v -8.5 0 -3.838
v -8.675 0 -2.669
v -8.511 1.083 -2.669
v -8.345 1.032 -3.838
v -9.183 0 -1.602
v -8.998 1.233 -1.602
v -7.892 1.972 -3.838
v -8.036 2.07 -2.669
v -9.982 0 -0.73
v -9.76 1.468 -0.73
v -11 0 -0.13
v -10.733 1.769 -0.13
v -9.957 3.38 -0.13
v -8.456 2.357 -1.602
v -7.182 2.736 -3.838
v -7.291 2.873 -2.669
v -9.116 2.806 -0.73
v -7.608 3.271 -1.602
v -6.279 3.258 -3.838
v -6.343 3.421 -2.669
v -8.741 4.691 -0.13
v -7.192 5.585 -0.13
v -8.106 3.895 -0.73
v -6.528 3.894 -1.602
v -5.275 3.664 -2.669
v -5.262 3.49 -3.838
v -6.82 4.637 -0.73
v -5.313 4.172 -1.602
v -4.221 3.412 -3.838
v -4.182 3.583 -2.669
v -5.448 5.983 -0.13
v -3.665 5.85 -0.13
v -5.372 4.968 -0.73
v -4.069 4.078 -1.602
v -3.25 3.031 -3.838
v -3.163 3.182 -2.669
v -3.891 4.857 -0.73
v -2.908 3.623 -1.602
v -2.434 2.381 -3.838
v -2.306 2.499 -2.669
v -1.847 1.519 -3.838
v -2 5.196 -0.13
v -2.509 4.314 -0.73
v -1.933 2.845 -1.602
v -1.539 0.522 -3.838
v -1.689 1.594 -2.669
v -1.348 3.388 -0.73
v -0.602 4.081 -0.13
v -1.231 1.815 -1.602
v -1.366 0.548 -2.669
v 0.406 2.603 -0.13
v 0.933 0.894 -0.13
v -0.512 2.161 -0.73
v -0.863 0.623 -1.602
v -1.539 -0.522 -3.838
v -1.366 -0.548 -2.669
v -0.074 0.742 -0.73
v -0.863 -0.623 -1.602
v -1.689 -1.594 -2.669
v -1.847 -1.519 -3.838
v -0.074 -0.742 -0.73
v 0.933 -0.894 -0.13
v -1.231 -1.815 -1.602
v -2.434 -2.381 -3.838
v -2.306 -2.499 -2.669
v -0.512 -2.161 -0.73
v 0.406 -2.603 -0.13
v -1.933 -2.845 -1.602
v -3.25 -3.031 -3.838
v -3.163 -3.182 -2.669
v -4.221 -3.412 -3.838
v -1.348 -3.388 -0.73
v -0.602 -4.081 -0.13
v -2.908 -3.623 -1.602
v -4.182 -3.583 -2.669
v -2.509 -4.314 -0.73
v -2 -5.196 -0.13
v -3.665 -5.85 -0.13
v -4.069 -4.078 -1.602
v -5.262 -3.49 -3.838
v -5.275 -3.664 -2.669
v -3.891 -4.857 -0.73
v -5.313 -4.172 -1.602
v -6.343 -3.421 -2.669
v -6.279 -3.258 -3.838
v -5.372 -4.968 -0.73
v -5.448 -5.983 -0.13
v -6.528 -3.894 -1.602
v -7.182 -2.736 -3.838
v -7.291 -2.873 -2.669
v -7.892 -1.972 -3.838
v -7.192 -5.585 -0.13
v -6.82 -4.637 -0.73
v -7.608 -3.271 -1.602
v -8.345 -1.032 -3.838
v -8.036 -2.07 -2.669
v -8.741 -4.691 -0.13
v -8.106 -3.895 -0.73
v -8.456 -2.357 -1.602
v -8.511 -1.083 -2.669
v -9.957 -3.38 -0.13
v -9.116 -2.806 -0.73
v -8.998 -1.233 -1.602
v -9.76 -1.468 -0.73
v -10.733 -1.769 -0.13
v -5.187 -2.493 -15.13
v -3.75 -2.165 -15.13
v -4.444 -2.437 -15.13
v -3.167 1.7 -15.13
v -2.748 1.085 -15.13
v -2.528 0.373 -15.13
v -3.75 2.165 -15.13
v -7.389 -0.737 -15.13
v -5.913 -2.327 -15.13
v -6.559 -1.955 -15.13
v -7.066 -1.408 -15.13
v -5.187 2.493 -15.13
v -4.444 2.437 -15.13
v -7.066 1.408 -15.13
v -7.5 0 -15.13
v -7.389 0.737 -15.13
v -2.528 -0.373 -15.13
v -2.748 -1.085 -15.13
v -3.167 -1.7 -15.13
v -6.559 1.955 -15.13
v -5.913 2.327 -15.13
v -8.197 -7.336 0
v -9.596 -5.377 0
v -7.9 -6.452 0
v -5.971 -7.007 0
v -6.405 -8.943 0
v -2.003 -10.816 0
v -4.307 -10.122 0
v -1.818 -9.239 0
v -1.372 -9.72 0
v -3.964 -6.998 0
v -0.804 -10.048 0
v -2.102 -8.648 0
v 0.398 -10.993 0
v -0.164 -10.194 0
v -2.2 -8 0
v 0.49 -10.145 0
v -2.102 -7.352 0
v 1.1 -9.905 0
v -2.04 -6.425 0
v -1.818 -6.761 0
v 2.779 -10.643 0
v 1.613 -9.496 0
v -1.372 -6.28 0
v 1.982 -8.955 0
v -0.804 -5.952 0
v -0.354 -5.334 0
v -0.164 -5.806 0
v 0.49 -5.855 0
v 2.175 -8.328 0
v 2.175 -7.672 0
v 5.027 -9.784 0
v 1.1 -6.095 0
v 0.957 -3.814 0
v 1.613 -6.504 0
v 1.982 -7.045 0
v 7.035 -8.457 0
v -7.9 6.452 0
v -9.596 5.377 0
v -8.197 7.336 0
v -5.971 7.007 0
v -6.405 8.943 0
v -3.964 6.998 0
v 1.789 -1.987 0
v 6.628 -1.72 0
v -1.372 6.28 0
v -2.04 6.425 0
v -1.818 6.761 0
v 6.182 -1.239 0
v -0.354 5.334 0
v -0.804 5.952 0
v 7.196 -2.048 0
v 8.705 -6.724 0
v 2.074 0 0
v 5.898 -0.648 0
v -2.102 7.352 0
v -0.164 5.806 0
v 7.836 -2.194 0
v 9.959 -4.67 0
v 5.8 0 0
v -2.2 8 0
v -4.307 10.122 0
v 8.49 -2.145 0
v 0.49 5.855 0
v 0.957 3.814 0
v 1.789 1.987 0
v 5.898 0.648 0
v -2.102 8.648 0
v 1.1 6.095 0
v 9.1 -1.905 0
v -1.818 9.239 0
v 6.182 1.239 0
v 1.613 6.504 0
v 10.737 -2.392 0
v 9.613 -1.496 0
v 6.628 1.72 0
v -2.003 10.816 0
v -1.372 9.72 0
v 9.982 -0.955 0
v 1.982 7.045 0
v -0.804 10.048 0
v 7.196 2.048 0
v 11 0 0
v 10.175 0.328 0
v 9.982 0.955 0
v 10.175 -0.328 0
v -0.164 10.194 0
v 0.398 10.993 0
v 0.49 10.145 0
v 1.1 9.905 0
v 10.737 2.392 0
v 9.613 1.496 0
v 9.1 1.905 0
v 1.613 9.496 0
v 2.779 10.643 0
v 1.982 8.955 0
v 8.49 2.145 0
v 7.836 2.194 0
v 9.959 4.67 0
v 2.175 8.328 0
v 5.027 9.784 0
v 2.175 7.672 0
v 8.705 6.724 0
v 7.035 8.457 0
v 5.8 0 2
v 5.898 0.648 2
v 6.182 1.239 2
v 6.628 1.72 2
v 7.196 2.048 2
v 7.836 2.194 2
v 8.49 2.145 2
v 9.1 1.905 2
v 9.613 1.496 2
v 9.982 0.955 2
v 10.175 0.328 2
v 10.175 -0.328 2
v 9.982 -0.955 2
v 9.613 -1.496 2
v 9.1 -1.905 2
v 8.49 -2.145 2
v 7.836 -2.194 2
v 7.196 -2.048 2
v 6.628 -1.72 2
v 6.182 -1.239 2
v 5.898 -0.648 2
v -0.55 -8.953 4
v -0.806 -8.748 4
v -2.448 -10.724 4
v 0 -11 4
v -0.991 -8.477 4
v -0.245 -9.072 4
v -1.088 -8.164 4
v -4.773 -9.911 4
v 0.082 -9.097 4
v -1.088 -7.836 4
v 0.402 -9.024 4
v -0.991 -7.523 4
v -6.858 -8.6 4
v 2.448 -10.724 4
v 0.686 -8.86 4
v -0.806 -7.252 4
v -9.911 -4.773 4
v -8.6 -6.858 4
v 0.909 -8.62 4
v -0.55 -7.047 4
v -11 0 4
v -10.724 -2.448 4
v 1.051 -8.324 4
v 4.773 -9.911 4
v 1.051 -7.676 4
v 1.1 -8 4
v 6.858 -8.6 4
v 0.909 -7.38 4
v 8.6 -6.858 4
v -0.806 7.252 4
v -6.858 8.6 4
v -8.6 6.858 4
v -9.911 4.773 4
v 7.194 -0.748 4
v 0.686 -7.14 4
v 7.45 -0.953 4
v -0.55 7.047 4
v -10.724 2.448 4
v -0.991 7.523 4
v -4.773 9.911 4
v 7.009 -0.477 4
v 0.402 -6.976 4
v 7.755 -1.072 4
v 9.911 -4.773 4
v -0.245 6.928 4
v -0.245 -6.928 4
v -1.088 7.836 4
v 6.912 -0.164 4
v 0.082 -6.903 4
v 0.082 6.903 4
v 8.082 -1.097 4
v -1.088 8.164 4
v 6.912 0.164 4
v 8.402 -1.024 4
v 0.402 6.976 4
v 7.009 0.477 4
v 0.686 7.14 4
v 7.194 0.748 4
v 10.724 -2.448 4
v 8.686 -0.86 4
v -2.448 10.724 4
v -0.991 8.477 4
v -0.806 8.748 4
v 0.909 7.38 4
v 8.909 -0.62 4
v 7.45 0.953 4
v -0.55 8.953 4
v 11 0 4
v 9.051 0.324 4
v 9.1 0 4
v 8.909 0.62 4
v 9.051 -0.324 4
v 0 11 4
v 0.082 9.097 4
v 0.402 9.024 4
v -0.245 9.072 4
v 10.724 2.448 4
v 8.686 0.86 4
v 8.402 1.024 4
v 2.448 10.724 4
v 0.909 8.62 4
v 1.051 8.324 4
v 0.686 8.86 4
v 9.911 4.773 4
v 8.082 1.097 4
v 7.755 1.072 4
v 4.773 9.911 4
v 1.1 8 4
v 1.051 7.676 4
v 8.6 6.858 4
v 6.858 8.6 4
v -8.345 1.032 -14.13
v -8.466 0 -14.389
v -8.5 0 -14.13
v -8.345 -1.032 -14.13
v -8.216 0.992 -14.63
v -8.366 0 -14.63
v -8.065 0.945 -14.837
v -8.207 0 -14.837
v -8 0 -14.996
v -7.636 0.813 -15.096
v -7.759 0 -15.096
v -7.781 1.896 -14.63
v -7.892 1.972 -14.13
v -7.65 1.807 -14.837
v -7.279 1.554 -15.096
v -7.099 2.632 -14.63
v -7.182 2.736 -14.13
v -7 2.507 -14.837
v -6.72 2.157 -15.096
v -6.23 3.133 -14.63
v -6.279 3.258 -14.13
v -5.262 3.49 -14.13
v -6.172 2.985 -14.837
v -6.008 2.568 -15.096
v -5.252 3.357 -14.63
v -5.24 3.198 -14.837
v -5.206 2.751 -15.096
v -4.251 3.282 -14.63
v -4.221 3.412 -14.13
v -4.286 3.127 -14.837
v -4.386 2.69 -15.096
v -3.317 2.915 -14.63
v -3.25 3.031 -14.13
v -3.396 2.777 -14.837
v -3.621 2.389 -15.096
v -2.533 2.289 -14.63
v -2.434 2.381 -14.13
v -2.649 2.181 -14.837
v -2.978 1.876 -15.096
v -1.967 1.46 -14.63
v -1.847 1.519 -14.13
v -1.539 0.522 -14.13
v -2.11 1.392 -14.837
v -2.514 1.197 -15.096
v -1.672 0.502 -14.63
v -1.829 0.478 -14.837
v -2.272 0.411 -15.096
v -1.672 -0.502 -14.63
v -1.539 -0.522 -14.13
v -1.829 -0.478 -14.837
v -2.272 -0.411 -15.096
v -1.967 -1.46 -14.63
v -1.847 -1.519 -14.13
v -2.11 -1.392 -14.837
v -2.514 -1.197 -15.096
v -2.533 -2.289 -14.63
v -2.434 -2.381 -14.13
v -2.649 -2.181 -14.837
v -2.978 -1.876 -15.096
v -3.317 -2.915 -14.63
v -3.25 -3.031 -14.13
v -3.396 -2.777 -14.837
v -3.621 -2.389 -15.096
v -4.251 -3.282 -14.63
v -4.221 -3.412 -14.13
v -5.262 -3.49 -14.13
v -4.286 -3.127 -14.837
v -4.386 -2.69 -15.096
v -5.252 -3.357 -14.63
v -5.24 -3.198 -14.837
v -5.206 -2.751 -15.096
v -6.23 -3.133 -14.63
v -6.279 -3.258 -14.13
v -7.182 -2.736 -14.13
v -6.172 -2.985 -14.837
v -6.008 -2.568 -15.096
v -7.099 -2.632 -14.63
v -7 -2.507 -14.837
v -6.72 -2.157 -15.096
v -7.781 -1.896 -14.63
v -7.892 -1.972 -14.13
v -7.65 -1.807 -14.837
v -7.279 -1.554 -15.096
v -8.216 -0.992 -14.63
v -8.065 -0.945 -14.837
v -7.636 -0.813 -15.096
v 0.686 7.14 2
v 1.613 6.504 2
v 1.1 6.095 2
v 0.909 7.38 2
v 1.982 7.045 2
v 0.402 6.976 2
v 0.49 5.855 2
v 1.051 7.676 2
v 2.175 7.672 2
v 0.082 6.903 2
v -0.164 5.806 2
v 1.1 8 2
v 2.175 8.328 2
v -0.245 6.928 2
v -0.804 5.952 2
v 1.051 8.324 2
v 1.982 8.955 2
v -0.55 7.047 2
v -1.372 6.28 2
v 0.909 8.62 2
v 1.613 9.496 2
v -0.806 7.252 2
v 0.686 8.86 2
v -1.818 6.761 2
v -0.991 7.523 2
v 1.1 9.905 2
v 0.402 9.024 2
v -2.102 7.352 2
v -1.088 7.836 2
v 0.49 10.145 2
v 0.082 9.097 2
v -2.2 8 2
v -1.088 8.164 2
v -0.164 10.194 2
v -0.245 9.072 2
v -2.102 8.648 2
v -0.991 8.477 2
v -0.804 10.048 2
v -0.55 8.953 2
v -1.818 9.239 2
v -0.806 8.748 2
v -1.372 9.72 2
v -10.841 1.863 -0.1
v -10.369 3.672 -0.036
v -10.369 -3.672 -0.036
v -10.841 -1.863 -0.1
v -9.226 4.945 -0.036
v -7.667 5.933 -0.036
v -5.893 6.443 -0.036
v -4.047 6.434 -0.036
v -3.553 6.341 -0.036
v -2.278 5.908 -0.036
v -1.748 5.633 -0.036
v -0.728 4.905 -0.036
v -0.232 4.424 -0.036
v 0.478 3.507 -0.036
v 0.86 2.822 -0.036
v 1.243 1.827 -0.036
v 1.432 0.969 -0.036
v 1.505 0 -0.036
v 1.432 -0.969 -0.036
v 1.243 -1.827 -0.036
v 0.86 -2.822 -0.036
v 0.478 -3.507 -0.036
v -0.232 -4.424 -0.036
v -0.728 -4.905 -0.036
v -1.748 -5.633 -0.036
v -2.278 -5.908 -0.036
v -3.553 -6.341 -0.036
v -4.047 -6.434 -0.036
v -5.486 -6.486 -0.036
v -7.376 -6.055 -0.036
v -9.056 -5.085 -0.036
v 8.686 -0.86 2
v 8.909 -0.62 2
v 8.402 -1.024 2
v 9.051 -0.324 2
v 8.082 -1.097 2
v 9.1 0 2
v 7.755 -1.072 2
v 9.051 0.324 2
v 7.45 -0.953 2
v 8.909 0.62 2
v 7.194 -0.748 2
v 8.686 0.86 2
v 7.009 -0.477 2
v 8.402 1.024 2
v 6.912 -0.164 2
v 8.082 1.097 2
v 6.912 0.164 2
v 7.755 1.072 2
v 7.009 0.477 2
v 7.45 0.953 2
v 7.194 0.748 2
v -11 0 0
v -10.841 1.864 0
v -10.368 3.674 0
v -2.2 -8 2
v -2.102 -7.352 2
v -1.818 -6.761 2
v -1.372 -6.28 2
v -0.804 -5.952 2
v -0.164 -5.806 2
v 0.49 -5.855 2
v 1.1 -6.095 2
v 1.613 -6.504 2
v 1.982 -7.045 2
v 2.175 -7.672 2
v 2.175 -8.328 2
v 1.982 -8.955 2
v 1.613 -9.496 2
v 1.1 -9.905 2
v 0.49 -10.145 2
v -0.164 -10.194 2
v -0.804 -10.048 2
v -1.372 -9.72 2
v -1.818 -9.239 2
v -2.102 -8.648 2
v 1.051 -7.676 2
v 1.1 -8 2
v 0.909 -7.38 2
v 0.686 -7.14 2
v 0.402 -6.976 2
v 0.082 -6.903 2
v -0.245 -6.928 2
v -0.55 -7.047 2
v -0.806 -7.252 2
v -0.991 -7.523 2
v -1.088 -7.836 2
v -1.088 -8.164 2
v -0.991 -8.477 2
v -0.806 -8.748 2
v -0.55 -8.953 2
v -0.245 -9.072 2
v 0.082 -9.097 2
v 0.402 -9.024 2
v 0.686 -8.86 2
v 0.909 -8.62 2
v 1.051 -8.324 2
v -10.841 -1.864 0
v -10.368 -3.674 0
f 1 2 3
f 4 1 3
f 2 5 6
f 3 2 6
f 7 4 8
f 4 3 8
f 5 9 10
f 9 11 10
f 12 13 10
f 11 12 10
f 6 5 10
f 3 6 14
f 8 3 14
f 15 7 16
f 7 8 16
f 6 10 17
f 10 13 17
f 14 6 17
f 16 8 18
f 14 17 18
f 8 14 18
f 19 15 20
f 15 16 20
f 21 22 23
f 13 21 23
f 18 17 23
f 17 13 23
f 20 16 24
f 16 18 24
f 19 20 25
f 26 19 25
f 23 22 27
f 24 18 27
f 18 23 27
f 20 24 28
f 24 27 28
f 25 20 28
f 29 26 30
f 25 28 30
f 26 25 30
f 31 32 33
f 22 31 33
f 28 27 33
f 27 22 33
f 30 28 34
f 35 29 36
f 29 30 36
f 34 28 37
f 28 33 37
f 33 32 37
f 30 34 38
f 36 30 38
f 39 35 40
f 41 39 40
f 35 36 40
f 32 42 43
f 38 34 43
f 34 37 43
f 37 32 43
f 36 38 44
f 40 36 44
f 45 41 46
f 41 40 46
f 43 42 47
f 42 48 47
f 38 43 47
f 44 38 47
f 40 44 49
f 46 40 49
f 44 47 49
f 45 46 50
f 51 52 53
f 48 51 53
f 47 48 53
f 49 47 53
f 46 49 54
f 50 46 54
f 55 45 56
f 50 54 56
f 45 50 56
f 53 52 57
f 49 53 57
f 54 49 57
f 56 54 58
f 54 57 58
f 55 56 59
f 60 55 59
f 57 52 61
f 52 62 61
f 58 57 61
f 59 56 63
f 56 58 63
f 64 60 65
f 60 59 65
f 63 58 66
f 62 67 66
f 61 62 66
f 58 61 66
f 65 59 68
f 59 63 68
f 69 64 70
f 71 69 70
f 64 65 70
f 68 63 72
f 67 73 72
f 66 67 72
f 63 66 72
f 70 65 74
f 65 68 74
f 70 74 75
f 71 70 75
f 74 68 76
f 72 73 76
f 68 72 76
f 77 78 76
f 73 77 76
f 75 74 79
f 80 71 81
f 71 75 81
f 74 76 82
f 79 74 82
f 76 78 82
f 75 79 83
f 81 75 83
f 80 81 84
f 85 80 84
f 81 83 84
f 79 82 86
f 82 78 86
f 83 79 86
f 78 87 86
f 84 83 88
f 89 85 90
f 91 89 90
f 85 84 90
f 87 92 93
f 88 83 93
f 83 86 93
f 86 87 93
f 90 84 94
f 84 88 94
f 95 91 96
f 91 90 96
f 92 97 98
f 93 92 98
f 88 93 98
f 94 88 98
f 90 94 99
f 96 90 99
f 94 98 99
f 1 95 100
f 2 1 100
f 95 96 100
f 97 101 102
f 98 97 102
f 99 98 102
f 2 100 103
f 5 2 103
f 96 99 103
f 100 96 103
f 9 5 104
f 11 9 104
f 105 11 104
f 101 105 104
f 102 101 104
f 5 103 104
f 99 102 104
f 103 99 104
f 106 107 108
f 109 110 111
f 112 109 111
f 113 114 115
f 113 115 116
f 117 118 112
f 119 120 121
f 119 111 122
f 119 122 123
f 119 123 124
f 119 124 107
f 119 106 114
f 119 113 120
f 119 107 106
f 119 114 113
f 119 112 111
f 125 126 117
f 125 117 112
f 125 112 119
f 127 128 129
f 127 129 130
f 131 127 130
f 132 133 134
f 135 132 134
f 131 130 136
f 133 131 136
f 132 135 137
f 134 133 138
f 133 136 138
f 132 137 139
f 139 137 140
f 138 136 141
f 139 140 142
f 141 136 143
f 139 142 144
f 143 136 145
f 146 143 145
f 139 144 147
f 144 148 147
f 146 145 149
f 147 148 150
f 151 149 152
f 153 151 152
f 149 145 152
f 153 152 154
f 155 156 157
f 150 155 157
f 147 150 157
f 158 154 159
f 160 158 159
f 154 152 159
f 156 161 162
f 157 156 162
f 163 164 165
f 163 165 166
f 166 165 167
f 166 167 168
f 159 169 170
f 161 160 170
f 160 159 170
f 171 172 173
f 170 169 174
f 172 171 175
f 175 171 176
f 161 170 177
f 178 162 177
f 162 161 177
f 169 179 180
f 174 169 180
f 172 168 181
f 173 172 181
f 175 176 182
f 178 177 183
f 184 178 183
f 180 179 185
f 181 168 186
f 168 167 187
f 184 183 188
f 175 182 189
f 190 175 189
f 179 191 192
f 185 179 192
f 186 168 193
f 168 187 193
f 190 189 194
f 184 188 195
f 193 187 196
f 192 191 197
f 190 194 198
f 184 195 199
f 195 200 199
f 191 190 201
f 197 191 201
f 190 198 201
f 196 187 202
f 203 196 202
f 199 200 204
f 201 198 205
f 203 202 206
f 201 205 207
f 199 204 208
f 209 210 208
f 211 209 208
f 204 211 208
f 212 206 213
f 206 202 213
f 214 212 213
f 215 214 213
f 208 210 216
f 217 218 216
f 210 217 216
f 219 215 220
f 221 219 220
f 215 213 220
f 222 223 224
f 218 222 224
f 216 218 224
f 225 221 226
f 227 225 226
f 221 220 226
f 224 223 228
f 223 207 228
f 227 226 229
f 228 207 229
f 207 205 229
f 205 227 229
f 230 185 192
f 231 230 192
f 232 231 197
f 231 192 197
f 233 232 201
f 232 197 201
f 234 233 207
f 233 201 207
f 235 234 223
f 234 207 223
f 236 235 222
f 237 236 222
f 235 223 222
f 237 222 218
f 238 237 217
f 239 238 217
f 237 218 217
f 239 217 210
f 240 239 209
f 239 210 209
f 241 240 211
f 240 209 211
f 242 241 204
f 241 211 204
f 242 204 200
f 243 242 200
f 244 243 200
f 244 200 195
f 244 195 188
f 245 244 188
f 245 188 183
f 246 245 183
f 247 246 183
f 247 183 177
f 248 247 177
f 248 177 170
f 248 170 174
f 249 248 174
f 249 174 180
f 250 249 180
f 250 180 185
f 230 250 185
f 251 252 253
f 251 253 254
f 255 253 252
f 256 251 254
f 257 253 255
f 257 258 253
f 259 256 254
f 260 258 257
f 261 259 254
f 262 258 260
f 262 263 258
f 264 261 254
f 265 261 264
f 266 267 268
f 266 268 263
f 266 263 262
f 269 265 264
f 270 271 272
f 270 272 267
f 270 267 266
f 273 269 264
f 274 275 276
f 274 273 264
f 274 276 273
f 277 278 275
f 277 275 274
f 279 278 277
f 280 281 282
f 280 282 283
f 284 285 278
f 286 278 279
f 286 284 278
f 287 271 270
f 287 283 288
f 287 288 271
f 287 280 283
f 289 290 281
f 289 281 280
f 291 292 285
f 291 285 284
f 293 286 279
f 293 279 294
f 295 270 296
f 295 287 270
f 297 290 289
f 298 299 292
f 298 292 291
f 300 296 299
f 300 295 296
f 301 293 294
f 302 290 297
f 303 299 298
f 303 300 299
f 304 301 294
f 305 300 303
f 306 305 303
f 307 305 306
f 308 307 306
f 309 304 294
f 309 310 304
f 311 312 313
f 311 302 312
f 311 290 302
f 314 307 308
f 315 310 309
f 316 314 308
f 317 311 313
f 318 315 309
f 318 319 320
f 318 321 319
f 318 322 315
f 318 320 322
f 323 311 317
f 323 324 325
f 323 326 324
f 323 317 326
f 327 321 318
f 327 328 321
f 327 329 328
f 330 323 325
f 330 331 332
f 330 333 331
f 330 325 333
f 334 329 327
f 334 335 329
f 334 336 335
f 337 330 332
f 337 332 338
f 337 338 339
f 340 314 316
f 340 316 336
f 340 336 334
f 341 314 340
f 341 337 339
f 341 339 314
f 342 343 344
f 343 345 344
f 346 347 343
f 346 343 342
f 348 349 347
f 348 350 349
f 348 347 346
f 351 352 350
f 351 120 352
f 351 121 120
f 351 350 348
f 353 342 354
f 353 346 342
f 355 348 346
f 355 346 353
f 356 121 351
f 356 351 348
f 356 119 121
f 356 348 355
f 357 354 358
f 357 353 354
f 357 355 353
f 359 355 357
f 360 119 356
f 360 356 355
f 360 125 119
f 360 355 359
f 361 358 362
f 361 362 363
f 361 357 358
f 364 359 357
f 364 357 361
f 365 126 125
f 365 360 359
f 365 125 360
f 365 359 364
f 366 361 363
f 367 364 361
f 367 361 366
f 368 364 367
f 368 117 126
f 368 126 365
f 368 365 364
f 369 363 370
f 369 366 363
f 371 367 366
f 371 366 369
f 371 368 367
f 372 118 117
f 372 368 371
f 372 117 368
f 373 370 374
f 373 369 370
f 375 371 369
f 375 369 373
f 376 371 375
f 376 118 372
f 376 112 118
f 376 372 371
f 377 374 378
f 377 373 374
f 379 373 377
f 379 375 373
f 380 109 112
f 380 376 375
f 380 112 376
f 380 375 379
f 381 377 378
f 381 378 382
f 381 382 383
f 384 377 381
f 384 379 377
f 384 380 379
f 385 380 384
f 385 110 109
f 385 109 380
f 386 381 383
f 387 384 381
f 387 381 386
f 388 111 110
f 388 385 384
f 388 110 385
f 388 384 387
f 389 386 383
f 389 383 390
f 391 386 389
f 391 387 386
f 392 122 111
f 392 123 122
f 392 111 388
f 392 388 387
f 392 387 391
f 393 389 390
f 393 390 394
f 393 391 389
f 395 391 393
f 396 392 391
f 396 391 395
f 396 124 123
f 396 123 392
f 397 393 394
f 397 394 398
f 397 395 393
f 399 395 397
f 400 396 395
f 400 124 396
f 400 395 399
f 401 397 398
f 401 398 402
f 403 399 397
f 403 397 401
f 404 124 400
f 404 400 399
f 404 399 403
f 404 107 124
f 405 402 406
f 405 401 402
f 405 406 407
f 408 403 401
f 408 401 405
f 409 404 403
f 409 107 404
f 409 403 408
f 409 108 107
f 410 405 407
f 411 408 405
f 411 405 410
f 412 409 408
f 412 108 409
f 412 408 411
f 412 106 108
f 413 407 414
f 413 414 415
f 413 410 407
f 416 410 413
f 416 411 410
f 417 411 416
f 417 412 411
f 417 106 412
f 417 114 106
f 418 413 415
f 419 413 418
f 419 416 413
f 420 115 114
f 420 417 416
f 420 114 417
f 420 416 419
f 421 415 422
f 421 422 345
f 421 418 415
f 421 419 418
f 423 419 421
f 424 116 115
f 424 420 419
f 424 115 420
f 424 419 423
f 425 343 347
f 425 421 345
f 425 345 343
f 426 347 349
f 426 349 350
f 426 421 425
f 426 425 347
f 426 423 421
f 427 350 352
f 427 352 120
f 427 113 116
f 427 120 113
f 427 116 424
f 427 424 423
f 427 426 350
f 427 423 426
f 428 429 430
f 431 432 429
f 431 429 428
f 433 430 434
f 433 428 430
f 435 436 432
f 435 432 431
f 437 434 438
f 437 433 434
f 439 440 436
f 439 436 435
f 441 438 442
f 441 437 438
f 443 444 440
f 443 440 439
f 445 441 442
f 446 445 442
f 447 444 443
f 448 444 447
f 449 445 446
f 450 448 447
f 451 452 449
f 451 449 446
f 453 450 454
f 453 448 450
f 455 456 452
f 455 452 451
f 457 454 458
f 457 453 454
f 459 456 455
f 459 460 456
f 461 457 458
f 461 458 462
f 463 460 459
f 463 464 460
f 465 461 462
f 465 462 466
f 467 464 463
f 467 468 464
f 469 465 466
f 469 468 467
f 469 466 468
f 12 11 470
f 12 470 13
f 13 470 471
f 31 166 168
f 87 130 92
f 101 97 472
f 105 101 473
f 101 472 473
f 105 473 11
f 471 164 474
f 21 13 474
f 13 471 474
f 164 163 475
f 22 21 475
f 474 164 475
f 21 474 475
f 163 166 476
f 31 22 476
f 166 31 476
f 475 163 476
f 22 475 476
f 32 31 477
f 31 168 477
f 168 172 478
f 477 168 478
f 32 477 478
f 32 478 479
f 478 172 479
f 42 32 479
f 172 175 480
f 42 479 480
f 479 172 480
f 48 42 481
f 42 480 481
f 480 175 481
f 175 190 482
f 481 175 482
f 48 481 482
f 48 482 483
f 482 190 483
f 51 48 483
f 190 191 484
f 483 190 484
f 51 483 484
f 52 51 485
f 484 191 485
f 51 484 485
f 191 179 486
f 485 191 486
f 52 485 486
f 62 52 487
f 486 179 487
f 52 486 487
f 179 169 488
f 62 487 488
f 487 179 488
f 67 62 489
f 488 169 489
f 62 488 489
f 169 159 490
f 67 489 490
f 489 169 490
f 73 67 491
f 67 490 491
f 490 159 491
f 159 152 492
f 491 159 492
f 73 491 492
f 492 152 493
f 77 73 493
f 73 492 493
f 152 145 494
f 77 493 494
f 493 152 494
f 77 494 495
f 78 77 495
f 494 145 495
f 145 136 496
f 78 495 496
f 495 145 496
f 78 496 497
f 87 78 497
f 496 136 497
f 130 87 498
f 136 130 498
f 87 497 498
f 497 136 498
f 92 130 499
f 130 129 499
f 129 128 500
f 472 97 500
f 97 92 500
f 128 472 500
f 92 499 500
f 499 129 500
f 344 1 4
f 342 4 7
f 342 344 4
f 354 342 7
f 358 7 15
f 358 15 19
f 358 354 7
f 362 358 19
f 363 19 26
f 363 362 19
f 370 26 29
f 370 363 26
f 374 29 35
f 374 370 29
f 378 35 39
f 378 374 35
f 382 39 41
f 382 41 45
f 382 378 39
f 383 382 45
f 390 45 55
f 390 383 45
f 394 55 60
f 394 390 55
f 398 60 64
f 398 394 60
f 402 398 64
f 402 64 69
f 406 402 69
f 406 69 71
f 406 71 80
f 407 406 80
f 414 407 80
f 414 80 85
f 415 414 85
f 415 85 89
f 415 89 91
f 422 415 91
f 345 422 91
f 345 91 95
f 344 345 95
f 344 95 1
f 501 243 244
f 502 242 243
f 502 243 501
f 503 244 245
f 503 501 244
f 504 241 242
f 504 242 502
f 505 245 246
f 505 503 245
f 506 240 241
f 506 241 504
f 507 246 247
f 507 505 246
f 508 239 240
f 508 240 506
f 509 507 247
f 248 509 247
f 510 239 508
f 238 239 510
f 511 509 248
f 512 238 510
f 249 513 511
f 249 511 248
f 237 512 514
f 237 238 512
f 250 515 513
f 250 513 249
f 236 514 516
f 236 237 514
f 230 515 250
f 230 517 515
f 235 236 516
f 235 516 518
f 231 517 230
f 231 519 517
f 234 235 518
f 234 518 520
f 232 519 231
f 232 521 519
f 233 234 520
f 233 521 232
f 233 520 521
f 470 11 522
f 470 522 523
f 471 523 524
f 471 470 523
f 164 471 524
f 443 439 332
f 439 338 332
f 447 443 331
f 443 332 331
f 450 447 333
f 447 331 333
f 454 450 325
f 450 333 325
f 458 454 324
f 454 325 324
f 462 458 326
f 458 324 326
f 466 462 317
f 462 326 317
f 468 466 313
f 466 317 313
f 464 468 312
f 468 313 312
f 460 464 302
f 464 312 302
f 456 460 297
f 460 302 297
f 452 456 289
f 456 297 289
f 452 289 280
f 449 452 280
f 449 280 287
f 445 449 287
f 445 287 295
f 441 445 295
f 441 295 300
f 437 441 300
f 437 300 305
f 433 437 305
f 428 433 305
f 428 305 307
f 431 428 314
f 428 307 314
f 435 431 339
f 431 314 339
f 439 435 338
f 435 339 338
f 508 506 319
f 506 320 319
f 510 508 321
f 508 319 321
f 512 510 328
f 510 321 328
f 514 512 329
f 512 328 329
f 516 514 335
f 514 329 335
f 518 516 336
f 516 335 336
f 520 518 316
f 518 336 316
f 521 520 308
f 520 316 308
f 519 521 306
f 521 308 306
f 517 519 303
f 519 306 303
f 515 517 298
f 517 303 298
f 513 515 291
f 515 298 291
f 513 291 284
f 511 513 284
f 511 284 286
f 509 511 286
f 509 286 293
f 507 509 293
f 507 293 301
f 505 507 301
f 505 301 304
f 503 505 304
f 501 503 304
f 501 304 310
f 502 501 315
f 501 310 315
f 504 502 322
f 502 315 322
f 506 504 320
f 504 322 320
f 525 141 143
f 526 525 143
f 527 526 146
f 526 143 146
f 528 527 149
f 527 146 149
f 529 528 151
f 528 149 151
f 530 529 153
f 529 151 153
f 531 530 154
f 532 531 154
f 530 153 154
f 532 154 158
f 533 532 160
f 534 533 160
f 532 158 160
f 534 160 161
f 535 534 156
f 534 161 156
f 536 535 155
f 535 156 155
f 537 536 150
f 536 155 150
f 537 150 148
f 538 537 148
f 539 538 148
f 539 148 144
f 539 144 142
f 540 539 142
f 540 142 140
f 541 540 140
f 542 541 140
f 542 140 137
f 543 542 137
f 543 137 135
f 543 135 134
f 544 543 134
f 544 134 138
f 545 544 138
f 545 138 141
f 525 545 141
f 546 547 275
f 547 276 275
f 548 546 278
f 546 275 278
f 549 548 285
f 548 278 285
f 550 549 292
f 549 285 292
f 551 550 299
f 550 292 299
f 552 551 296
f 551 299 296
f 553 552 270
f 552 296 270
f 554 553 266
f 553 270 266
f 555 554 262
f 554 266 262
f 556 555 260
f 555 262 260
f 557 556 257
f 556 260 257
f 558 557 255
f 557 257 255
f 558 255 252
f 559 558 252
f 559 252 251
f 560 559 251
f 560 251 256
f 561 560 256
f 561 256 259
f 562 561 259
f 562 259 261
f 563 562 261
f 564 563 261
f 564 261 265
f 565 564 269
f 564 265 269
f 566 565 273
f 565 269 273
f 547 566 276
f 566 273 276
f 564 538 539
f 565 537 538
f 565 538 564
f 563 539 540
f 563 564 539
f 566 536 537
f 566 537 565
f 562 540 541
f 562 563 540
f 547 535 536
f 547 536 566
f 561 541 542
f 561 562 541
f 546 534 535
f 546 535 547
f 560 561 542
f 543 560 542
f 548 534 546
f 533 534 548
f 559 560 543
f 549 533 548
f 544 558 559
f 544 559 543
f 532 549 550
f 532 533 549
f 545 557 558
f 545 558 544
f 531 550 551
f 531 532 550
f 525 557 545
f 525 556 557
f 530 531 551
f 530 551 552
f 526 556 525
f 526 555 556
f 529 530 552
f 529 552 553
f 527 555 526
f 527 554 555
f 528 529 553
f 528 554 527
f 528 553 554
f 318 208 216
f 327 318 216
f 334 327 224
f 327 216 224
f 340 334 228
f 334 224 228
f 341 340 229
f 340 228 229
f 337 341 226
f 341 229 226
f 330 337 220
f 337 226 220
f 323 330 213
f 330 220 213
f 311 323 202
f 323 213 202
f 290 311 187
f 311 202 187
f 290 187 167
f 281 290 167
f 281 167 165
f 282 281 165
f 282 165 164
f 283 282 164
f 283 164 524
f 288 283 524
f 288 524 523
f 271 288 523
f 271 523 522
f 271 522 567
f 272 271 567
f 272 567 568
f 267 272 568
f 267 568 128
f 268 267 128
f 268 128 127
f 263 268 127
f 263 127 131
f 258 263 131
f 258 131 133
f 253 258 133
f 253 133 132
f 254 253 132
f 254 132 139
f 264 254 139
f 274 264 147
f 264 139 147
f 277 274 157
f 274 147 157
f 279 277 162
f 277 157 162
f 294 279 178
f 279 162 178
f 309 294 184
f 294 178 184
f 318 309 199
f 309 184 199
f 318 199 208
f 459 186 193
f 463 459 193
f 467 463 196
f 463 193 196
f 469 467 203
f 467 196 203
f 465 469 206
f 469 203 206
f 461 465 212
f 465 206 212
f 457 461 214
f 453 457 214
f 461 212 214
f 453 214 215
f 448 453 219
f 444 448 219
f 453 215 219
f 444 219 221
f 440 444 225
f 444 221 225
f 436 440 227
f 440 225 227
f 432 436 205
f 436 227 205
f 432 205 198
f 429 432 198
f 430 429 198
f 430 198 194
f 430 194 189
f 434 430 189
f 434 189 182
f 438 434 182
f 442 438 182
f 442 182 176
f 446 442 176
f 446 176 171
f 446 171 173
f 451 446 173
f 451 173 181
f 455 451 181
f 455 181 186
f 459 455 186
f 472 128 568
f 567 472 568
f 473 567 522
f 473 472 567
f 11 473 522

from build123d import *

# Parameters (mm, degrees)
SKETCH1_R                      = 11
SKETCH1_R_2                    = 1.05
BOSS_EXTRUDE1_DEPTH            = 4
SKETCH9_R                      = 6
BOSS_EXTRUDE2_DEPTH            = 15.13
SKETCH10_OUTSIDE_W             = 31.304
SKETCH10_OUTSIDE_H             = 31.304
SKETCH10_OUTSIDE_R             = 3.5
CUT_EXTRUDE2_DEPTH             = 15
FILLET1_R                      = 4.5
FILLET2_R                      = 1
FILLET4_R                      = 4
CBORE_FOR_M2_SHCS1_D           = 2.2
CBORE_FOR_M2_SHCS1_CBORE_D     = 4.4
CBORE_FOR_M2_SHCS1_CBORE_DEPTH = 2


with BuildPart() as part:
    # Sketch1 → Boss-Extrude1 (new body)
    with BuildSketch(Plane.XY):
        Circle(SKETCH1_R)
        with Locations((0, 8)):
            Circle(SKETCH1_R_2, mode=Mode.SUBTRACT)
        with Locations((8, 0)):
            Circle(SKETCH1_R_2, mode=Mode.SUBTRACT)
        with Locations((0, -8)):
            Circle(SKETCH1_R_2, mode=Mode.SUBTRACT)
    extrude(amount=BOSS_EXTRUDE1_DEPTH)

    # Sketch9 → Boss-Extrude2 (add)
    with BuildSketch(Plane(origin=(0, 0, 0), x_dir=(-1, 0, 0), z_dir=(0, 0, -1))):
        with Locations((5, 0)):
            Circle(SKETCH9_R)
    extrude(amount=BOSS_EXTRUDE2_DEPTH)

    # Sketch10 outside → Cut-Extrude2 (cut)
    with BuildSketch(Plane(origin=(0, 0, -15.13), x_dir=(-1, 0, 0), z_dir=(0, 0, -1))):
        Rectangle(SKETCH10_OUTSIDE_W, SKETCH10_OUTSIDE_H)
        with Locations((5, 0)):
            Circle(SKETCH10_OUTSIDE_R, mode=Mode.SUBTRACT)
    extrude(amount=-CUT_EXTRUDE2_DEPTH, mode=Mode.SUBTRACT)

    # Fillet1
    # the kernel refuses this fillet: 4.5 mm, written as the material it adds along each edge
    with BuildSketch(Plane(origin=(-5, 0, 0), x_dir=(-1, 0, 0), z_dir=(0, -1, 0))) as fillet1_piece_1_section:
        with BuildLine():
            CenterArc((7.073824939, 4.5), FILLET1_R, 256.19443595, 13.80556405)
            Line((6, 0.13), (6, 0))
            Line((6, 0), (7.073824939, 0))
        make_face()
    fillet1_piece_1 = revolve(axis=Axis((-5, 0, 0), (0, 0, -1)), mode=Mode.PRIVATE)
    fillet1_piece_1 = fillet1_piece_1 & Plane(origin=(0, 0, -0.023683453), x_dir=(1, 0, 0), z_dir=(0, 0, -1)) * Cylinder(11, 29, mode=Mode.PRIVATE)
    add(fillet1_piece_1)

    # Fillet2
    fillet2_edges = [part.edges().sort_by_distance(p)[0] for p in [
        (-1.5, 0, -15.13),
    ]]
    fillet(fillet2_edges, radius=FILLET2_R)

    # Fillet4
    # the kernel refuses this fillet: 4 mm, written as the material it adds along each edge
    with BuildSketch(Plane(origin=(-5, 0, -0.13), x_dir=(-1, 0, 0), z_dir=(0, -1, 0))) as fillet4_piece_1:
        with BuildLine():
            CenterArc((7.5, 3.708099244), FILLET4_R, 180, 67.975687163)
            Line((6, 0), (5.97, -0.074161985))
            ThreePointArc((5.97, -0.074161985), (4.75, -0.08), (3.5, -0.08))
            Line((3.5, -0.08), (3.42, 0))
            Line((3.42, 0), (3.42, 3.708099244))
            Line((3.42, 3.708099244), (3.5, 3.708099244))
        make_face()
    revolve(axis=Axis((-5, 0, -0.13), (0, 0, -1)))

    # CBORE for M2 SHCS1 (through all)
    with Locations(Plane(origin=(0, 0, 0), x_dir=(-1, 0, 0), z_dir=(0, 0, -1))):
        with Locations((0, 8), (-8, 0), (0, -8)):
            CounterBoreHole(CBORE_FOR_M2_SHCS1_D / 2, CBORE_FOR_M2_SHCS1_CBORE_D / 2, CBORE_FOR_M2_SHCS1_CBORE_DEPTH)


solid = part.part
